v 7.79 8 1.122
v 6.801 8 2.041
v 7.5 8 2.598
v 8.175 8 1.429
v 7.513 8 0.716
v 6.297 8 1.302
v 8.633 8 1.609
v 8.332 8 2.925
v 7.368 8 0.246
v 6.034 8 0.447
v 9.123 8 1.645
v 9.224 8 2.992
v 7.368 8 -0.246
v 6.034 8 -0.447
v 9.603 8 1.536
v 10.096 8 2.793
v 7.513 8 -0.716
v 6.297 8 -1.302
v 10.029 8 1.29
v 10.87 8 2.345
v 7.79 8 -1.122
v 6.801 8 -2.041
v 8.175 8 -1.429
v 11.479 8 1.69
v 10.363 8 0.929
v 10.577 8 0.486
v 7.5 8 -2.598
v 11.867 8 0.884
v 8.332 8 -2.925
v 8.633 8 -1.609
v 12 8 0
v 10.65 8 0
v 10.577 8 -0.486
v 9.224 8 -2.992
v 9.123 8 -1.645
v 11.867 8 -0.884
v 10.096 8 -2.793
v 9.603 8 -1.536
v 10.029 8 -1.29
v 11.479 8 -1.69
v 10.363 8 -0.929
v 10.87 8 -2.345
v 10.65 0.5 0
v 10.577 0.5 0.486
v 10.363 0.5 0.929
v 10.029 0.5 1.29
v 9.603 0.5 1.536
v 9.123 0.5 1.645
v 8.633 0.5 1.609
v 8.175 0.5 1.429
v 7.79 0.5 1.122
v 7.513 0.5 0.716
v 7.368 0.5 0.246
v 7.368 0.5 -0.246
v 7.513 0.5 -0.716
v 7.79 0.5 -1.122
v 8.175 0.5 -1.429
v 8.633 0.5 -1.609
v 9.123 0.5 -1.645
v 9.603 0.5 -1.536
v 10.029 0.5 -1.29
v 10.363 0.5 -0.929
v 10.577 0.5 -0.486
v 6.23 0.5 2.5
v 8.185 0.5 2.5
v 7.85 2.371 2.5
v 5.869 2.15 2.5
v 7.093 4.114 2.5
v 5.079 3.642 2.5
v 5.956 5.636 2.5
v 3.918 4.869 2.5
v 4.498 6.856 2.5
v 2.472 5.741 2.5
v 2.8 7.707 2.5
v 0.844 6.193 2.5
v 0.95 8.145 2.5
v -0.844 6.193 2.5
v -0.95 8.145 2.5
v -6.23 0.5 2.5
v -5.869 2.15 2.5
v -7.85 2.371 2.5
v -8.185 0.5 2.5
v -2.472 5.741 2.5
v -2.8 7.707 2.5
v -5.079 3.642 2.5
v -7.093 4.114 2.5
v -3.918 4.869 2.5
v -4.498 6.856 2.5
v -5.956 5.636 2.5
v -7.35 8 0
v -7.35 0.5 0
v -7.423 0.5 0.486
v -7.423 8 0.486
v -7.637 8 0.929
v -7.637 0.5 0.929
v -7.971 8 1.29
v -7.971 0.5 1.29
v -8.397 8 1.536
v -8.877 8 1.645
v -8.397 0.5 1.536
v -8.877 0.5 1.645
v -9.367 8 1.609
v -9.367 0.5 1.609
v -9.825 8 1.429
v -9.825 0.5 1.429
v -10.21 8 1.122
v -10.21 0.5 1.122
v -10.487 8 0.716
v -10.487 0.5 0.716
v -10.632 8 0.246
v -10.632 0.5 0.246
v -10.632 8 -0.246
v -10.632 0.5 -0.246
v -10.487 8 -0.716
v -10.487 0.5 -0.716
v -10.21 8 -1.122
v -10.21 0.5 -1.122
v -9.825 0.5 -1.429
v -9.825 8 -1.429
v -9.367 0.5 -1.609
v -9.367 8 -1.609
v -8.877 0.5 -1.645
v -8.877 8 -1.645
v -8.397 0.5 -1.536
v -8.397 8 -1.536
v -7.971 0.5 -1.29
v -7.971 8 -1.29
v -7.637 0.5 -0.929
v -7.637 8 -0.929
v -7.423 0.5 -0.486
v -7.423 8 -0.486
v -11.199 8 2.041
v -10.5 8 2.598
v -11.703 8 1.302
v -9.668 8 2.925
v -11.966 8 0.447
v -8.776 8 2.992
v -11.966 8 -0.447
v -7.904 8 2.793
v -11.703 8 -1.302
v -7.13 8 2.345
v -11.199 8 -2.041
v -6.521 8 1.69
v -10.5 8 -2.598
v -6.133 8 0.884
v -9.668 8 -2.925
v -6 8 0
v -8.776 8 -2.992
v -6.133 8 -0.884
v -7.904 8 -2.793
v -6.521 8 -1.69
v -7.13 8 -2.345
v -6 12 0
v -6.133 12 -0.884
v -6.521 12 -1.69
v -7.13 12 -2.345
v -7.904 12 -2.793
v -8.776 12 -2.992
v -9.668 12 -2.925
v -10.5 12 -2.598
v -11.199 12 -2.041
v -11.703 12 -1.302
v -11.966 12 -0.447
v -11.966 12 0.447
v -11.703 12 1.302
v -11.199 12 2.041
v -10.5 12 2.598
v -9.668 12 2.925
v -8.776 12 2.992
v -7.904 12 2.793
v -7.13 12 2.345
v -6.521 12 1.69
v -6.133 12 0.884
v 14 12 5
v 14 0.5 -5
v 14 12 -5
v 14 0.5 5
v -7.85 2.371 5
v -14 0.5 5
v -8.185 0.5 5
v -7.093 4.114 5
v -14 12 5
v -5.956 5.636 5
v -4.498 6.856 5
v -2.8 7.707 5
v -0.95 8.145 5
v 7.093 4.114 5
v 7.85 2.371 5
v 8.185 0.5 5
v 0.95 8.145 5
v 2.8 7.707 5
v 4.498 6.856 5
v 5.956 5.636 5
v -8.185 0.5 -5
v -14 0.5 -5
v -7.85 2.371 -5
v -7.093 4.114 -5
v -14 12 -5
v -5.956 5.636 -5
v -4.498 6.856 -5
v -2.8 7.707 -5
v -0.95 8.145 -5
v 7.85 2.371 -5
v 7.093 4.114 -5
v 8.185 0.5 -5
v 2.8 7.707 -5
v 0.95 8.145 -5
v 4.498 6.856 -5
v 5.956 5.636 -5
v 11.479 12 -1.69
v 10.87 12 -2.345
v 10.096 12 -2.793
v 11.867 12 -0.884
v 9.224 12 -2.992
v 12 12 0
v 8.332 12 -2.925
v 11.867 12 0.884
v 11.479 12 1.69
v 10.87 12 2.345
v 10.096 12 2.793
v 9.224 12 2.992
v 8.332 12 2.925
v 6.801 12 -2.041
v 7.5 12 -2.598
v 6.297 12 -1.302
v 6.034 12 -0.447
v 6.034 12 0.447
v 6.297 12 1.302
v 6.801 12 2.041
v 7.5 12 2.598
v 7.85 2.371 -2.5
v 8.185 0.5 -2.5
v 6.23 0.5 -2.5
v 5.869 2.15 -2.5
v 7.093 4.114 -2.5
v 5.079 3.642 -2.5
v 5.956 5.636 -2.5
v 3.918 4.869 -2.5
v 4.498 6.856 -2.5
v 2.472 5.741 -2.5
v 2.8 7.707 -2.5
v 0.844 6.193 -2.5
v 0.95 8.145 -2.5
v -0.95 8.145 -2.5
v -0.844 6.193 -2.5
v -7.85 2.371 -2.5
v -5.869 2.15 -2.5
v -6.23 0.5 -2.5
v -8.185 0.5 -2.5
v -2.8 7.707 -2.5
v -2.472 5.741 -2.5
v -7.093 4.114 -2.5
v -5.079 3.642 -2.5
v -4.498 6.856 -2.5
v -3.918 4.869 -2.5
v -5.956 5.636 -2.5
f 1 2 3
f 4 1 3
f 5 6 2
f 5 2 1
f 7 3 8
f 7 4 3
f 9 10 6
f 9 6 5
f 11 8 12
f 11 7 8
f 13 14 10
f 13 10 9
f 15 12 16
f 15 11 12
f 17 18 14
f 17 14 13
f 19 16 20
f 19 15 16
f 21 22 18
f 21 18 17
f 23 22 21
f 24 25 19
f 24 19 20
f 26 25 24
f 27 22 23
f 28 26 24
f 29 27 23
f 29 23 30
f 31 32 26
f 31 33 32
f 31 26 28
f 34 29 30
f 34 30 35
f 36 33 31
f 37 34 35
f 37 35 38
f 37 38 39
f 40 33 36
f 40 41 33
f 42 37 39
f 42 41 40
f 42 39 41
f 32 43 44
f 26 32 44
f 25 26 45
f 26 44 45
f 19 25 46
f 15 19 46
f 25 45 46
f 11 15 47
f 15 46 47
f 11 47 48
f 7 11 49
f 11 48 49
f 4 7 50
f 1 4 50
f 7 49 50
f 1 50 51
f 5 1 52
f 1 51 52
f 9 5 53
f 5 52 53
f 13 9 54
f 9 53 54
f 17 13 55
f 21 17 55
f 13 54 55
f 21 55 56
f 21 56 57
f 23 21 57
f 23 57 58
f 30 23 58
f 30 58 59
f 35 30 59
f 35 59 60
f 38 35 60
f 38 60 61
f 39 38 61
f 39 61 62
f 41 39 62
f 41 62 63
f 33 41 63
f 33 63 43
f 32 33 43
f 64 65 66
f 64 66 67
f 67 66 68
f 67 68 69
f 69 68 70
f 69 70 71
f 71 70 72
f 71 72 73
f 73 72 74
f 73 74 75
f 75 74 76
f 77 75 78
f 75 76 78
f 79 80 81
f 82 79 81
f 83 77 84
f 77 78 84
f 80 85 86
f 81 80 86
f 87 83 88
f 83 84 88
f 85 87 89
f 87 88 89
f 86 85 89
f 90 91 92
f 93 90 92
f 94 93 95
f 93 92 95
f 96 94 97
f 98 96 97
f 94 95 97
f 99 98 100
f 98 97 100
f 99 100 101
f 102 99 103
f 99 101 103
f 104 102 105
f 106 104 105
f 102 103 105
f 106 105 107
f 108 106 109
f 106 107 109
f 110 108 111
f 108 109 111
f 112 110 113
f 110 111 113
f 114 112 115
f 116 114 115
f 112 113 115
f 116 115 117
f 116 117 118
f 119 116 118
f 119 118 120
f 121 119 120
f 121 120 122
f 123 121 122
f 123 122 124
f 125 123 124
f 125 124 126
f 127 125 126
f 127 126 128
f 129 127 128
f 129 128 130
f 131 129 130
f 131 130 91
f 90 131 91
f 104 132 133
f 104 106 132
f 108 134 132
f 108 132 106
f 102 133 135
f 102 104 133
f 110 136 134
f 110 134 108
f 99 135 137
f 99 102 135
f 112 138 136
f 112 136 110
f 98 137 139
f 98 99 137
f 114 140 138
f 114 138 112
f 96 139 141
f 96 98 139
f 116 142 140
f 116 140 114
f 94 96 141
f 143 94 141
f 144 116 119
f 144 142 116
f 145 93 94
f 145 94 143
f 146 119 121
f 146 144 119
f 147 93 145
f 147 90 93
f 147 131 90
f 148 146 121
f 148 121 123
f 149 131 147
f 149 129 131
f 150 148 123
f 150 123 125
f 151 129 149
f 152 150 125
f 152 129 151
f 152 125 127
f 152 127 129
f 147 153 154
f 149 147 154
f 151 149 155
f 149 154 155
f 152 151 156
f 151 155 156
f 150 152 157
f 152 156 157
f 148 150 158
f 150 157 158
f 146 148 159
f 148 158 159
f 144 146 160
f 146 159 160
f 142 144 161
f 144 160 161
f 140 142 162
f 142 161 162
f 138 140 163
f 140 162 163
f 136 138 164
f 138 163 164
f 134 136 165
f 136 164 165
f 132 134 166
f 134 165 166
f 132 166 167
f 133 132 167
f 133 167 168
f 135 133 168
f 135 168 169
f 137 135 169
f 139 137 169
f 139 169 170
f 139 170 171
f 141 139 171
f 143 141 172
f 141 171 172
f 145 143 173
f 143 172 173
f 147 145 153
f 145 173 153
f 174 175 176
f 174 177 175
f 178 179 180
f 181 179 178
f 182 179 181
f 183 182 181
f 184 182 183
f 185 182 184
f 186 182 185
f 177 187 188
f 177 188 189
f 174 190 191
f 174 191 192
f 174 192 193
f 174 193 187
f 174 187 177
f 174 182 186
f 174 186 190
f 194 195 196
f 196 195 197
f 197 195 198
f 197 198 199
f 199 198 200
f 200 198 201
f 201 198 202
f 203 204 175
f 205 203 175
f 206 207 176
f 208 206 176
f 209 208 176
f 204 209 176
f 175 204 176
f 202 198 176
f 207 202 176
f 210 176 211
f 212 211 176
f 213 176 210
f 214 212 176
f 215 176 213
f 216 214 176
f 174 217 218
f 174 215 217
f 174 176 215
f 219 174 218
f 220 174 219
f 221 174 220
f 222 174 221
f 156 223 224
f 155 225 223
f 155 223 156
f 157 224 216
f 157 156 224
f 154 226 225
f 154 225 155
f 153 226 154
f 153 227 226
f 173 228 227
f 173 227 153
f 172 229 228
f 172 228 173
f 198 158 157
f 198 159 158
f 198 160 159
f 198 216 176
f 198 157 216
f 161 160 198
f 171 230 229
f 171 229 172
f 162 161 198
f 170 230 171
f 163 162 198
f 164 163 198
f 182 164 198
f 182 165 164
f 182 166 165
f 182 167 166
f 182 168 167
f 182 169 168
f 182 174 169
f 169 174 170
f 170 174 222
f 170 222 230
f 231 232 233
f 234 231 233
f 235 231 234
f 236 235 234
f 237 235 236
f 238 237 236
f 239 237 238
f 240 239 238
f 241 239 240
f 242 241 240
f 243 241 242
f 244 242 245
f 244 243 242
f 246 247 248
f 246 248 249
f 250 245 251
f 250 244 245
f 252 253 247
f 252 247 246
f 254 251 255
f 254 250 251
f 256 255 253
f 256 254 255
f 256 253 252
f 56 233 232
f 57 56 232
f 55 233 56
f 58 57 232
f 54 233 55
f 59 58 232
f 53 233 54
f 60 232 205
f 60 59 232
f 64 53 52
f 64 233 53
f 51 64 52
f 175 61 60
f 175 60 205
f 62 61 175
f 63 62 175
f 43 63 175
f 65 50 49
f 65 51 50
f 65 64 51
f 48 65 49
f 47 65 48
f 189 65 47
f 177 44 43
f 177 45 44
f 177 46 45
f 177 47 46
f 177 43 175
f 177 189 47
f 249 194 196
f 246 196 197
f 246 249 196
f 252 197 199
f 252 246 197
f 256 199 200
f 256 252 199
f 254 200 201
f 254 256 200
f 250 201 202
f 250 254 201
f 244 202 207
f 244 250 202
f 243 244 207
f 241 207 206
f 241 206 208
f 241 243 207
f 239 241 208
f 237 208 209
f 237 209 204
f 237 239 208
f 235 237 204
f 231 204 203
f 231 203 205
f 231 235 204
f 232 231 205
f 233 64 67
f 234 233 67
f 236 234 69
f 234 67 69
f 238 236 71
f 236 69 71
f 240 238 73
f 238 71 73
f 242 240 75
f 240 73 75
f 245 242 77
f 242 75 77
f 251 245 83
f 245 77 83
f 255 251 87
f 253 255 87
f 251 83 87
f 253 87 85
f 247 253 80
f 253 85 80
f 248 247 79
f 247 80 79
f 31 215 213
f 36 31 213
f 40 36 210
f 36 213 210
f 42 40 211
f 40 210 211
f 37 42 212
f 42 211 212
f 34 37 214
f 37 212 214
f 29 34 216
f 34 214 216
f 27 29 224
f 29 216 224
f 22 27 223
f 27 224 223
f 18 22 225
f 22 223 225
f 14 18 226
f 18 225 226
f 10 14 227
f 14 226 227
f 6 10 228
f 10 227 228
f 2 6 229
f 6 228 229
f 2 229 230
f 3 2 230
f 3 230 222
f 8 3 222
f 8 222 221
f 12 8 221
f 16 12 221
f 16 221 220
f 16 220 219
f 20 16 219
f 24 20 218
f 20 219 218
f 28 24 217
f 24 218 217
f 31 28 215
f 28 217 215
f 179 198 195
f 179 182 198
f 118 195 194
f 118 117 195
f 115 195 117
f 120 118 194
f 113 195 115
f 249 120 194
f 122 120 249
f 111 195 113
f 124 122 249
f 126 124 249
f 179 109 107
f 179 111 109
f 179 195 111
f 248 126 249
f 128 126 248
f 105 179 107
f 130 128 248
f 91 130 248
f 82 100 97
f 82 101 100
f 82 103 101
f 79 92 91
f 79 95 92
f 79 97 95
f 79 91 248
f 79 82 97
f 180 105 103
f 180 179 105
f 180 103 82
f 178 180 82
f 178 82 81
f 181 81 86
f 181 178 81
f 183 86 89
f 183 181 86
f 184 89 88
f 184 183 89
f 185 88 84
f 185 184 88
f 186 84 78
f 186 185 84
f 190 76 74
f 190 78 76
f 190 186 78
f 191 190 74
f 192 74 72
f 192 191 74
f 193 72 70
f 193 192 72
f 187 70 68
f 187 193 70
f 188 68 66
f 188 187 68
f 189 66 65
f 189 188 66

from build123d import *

# Parameters (mm, degrees)
RESSALTO_EXTRUS_O1_DEPTH = 2.5
RESSALTO_EXTRUS_O2_DEPTH = 5
ESBO_O2_R                = 1.65
CORTE_EXTRUS_O1_DEPTH    = 15
ESBO_O4_R                = 3
CORTE_EXTRUS_O2_DEPTH    = 4


with BuildPart() as part:
    # Esboço1 → Ressalto-extrusão1 (new body, symmetric)
    with BuildSketch(Plane.XY):
        with BuildLine():
            Line((-6.229967897, 0.5), (-14, 0.5))
            Line((-14, 0.5), (-14, 12))
            Line((-14, 12), (14, 12))
            Line((14, 12), (14, 0.5))
            Line((14, 0.5), (6.229967897, 0.5))
            ThreePointArc((6.229967897, 0.5), (0, 6.25), (-6.229967897, 0.5))
        make_face()
    extrude(amount=RESSALTO_EXTRUS_O1_DEPTH, both=True)

    # Esboço3 → Ressalto-extrusão2 (add, symmetric)
    with BuildSketch(Plane.XY):
        with BuildLine():
            Line((-14, 12), (-14, 0.5))
            Line((-14, 0.5), (-8.184741902, 0.5))
            ThreePointArc((-8.184741902, 0.5), (0, 8.2), (8.184741902, 0.5))
            Line((8.184741902, 0.5), (14, 0.5))
            Line((14, 0.5), (14, 12))
            Line((14, 12), (-14, 12))
        make_face()
    extrude(amount=RESSALTO_EXTRUS_O2_DEPTH, both=True)

    # Esboço2 → Corte-extrusão1 (cut)
    with BuildSketch(Plane.XZ.offset(-0.5)):
        with Locations((-9, 0)):
            Circle(ESBO_O2_R)
        with Locations((9, 0)):
            Circle(ESBO_O2_R)
    extrude(amount=-CORTE_EXTRUS_O1_DEPTH, mode=Mode.SUBTRACT)

    # Esboço4 → Corte-extrusão2 (cut)
    with BuildSketch(Plane(origin=(0, 12, 0), x_dir=(1, 0, 0), z_dir=(0, 1, 0))):
        with Locations((-9, 0)):
            Circle(ESBO_O4_R)
        with Locations((9, 0)):
            Circle(ESBO_O4_R)
    extrude(amount=-CORTE_EXTRUS_O2_DEPTH, mode=Mode.SUBTRACT)


solid = part.part
